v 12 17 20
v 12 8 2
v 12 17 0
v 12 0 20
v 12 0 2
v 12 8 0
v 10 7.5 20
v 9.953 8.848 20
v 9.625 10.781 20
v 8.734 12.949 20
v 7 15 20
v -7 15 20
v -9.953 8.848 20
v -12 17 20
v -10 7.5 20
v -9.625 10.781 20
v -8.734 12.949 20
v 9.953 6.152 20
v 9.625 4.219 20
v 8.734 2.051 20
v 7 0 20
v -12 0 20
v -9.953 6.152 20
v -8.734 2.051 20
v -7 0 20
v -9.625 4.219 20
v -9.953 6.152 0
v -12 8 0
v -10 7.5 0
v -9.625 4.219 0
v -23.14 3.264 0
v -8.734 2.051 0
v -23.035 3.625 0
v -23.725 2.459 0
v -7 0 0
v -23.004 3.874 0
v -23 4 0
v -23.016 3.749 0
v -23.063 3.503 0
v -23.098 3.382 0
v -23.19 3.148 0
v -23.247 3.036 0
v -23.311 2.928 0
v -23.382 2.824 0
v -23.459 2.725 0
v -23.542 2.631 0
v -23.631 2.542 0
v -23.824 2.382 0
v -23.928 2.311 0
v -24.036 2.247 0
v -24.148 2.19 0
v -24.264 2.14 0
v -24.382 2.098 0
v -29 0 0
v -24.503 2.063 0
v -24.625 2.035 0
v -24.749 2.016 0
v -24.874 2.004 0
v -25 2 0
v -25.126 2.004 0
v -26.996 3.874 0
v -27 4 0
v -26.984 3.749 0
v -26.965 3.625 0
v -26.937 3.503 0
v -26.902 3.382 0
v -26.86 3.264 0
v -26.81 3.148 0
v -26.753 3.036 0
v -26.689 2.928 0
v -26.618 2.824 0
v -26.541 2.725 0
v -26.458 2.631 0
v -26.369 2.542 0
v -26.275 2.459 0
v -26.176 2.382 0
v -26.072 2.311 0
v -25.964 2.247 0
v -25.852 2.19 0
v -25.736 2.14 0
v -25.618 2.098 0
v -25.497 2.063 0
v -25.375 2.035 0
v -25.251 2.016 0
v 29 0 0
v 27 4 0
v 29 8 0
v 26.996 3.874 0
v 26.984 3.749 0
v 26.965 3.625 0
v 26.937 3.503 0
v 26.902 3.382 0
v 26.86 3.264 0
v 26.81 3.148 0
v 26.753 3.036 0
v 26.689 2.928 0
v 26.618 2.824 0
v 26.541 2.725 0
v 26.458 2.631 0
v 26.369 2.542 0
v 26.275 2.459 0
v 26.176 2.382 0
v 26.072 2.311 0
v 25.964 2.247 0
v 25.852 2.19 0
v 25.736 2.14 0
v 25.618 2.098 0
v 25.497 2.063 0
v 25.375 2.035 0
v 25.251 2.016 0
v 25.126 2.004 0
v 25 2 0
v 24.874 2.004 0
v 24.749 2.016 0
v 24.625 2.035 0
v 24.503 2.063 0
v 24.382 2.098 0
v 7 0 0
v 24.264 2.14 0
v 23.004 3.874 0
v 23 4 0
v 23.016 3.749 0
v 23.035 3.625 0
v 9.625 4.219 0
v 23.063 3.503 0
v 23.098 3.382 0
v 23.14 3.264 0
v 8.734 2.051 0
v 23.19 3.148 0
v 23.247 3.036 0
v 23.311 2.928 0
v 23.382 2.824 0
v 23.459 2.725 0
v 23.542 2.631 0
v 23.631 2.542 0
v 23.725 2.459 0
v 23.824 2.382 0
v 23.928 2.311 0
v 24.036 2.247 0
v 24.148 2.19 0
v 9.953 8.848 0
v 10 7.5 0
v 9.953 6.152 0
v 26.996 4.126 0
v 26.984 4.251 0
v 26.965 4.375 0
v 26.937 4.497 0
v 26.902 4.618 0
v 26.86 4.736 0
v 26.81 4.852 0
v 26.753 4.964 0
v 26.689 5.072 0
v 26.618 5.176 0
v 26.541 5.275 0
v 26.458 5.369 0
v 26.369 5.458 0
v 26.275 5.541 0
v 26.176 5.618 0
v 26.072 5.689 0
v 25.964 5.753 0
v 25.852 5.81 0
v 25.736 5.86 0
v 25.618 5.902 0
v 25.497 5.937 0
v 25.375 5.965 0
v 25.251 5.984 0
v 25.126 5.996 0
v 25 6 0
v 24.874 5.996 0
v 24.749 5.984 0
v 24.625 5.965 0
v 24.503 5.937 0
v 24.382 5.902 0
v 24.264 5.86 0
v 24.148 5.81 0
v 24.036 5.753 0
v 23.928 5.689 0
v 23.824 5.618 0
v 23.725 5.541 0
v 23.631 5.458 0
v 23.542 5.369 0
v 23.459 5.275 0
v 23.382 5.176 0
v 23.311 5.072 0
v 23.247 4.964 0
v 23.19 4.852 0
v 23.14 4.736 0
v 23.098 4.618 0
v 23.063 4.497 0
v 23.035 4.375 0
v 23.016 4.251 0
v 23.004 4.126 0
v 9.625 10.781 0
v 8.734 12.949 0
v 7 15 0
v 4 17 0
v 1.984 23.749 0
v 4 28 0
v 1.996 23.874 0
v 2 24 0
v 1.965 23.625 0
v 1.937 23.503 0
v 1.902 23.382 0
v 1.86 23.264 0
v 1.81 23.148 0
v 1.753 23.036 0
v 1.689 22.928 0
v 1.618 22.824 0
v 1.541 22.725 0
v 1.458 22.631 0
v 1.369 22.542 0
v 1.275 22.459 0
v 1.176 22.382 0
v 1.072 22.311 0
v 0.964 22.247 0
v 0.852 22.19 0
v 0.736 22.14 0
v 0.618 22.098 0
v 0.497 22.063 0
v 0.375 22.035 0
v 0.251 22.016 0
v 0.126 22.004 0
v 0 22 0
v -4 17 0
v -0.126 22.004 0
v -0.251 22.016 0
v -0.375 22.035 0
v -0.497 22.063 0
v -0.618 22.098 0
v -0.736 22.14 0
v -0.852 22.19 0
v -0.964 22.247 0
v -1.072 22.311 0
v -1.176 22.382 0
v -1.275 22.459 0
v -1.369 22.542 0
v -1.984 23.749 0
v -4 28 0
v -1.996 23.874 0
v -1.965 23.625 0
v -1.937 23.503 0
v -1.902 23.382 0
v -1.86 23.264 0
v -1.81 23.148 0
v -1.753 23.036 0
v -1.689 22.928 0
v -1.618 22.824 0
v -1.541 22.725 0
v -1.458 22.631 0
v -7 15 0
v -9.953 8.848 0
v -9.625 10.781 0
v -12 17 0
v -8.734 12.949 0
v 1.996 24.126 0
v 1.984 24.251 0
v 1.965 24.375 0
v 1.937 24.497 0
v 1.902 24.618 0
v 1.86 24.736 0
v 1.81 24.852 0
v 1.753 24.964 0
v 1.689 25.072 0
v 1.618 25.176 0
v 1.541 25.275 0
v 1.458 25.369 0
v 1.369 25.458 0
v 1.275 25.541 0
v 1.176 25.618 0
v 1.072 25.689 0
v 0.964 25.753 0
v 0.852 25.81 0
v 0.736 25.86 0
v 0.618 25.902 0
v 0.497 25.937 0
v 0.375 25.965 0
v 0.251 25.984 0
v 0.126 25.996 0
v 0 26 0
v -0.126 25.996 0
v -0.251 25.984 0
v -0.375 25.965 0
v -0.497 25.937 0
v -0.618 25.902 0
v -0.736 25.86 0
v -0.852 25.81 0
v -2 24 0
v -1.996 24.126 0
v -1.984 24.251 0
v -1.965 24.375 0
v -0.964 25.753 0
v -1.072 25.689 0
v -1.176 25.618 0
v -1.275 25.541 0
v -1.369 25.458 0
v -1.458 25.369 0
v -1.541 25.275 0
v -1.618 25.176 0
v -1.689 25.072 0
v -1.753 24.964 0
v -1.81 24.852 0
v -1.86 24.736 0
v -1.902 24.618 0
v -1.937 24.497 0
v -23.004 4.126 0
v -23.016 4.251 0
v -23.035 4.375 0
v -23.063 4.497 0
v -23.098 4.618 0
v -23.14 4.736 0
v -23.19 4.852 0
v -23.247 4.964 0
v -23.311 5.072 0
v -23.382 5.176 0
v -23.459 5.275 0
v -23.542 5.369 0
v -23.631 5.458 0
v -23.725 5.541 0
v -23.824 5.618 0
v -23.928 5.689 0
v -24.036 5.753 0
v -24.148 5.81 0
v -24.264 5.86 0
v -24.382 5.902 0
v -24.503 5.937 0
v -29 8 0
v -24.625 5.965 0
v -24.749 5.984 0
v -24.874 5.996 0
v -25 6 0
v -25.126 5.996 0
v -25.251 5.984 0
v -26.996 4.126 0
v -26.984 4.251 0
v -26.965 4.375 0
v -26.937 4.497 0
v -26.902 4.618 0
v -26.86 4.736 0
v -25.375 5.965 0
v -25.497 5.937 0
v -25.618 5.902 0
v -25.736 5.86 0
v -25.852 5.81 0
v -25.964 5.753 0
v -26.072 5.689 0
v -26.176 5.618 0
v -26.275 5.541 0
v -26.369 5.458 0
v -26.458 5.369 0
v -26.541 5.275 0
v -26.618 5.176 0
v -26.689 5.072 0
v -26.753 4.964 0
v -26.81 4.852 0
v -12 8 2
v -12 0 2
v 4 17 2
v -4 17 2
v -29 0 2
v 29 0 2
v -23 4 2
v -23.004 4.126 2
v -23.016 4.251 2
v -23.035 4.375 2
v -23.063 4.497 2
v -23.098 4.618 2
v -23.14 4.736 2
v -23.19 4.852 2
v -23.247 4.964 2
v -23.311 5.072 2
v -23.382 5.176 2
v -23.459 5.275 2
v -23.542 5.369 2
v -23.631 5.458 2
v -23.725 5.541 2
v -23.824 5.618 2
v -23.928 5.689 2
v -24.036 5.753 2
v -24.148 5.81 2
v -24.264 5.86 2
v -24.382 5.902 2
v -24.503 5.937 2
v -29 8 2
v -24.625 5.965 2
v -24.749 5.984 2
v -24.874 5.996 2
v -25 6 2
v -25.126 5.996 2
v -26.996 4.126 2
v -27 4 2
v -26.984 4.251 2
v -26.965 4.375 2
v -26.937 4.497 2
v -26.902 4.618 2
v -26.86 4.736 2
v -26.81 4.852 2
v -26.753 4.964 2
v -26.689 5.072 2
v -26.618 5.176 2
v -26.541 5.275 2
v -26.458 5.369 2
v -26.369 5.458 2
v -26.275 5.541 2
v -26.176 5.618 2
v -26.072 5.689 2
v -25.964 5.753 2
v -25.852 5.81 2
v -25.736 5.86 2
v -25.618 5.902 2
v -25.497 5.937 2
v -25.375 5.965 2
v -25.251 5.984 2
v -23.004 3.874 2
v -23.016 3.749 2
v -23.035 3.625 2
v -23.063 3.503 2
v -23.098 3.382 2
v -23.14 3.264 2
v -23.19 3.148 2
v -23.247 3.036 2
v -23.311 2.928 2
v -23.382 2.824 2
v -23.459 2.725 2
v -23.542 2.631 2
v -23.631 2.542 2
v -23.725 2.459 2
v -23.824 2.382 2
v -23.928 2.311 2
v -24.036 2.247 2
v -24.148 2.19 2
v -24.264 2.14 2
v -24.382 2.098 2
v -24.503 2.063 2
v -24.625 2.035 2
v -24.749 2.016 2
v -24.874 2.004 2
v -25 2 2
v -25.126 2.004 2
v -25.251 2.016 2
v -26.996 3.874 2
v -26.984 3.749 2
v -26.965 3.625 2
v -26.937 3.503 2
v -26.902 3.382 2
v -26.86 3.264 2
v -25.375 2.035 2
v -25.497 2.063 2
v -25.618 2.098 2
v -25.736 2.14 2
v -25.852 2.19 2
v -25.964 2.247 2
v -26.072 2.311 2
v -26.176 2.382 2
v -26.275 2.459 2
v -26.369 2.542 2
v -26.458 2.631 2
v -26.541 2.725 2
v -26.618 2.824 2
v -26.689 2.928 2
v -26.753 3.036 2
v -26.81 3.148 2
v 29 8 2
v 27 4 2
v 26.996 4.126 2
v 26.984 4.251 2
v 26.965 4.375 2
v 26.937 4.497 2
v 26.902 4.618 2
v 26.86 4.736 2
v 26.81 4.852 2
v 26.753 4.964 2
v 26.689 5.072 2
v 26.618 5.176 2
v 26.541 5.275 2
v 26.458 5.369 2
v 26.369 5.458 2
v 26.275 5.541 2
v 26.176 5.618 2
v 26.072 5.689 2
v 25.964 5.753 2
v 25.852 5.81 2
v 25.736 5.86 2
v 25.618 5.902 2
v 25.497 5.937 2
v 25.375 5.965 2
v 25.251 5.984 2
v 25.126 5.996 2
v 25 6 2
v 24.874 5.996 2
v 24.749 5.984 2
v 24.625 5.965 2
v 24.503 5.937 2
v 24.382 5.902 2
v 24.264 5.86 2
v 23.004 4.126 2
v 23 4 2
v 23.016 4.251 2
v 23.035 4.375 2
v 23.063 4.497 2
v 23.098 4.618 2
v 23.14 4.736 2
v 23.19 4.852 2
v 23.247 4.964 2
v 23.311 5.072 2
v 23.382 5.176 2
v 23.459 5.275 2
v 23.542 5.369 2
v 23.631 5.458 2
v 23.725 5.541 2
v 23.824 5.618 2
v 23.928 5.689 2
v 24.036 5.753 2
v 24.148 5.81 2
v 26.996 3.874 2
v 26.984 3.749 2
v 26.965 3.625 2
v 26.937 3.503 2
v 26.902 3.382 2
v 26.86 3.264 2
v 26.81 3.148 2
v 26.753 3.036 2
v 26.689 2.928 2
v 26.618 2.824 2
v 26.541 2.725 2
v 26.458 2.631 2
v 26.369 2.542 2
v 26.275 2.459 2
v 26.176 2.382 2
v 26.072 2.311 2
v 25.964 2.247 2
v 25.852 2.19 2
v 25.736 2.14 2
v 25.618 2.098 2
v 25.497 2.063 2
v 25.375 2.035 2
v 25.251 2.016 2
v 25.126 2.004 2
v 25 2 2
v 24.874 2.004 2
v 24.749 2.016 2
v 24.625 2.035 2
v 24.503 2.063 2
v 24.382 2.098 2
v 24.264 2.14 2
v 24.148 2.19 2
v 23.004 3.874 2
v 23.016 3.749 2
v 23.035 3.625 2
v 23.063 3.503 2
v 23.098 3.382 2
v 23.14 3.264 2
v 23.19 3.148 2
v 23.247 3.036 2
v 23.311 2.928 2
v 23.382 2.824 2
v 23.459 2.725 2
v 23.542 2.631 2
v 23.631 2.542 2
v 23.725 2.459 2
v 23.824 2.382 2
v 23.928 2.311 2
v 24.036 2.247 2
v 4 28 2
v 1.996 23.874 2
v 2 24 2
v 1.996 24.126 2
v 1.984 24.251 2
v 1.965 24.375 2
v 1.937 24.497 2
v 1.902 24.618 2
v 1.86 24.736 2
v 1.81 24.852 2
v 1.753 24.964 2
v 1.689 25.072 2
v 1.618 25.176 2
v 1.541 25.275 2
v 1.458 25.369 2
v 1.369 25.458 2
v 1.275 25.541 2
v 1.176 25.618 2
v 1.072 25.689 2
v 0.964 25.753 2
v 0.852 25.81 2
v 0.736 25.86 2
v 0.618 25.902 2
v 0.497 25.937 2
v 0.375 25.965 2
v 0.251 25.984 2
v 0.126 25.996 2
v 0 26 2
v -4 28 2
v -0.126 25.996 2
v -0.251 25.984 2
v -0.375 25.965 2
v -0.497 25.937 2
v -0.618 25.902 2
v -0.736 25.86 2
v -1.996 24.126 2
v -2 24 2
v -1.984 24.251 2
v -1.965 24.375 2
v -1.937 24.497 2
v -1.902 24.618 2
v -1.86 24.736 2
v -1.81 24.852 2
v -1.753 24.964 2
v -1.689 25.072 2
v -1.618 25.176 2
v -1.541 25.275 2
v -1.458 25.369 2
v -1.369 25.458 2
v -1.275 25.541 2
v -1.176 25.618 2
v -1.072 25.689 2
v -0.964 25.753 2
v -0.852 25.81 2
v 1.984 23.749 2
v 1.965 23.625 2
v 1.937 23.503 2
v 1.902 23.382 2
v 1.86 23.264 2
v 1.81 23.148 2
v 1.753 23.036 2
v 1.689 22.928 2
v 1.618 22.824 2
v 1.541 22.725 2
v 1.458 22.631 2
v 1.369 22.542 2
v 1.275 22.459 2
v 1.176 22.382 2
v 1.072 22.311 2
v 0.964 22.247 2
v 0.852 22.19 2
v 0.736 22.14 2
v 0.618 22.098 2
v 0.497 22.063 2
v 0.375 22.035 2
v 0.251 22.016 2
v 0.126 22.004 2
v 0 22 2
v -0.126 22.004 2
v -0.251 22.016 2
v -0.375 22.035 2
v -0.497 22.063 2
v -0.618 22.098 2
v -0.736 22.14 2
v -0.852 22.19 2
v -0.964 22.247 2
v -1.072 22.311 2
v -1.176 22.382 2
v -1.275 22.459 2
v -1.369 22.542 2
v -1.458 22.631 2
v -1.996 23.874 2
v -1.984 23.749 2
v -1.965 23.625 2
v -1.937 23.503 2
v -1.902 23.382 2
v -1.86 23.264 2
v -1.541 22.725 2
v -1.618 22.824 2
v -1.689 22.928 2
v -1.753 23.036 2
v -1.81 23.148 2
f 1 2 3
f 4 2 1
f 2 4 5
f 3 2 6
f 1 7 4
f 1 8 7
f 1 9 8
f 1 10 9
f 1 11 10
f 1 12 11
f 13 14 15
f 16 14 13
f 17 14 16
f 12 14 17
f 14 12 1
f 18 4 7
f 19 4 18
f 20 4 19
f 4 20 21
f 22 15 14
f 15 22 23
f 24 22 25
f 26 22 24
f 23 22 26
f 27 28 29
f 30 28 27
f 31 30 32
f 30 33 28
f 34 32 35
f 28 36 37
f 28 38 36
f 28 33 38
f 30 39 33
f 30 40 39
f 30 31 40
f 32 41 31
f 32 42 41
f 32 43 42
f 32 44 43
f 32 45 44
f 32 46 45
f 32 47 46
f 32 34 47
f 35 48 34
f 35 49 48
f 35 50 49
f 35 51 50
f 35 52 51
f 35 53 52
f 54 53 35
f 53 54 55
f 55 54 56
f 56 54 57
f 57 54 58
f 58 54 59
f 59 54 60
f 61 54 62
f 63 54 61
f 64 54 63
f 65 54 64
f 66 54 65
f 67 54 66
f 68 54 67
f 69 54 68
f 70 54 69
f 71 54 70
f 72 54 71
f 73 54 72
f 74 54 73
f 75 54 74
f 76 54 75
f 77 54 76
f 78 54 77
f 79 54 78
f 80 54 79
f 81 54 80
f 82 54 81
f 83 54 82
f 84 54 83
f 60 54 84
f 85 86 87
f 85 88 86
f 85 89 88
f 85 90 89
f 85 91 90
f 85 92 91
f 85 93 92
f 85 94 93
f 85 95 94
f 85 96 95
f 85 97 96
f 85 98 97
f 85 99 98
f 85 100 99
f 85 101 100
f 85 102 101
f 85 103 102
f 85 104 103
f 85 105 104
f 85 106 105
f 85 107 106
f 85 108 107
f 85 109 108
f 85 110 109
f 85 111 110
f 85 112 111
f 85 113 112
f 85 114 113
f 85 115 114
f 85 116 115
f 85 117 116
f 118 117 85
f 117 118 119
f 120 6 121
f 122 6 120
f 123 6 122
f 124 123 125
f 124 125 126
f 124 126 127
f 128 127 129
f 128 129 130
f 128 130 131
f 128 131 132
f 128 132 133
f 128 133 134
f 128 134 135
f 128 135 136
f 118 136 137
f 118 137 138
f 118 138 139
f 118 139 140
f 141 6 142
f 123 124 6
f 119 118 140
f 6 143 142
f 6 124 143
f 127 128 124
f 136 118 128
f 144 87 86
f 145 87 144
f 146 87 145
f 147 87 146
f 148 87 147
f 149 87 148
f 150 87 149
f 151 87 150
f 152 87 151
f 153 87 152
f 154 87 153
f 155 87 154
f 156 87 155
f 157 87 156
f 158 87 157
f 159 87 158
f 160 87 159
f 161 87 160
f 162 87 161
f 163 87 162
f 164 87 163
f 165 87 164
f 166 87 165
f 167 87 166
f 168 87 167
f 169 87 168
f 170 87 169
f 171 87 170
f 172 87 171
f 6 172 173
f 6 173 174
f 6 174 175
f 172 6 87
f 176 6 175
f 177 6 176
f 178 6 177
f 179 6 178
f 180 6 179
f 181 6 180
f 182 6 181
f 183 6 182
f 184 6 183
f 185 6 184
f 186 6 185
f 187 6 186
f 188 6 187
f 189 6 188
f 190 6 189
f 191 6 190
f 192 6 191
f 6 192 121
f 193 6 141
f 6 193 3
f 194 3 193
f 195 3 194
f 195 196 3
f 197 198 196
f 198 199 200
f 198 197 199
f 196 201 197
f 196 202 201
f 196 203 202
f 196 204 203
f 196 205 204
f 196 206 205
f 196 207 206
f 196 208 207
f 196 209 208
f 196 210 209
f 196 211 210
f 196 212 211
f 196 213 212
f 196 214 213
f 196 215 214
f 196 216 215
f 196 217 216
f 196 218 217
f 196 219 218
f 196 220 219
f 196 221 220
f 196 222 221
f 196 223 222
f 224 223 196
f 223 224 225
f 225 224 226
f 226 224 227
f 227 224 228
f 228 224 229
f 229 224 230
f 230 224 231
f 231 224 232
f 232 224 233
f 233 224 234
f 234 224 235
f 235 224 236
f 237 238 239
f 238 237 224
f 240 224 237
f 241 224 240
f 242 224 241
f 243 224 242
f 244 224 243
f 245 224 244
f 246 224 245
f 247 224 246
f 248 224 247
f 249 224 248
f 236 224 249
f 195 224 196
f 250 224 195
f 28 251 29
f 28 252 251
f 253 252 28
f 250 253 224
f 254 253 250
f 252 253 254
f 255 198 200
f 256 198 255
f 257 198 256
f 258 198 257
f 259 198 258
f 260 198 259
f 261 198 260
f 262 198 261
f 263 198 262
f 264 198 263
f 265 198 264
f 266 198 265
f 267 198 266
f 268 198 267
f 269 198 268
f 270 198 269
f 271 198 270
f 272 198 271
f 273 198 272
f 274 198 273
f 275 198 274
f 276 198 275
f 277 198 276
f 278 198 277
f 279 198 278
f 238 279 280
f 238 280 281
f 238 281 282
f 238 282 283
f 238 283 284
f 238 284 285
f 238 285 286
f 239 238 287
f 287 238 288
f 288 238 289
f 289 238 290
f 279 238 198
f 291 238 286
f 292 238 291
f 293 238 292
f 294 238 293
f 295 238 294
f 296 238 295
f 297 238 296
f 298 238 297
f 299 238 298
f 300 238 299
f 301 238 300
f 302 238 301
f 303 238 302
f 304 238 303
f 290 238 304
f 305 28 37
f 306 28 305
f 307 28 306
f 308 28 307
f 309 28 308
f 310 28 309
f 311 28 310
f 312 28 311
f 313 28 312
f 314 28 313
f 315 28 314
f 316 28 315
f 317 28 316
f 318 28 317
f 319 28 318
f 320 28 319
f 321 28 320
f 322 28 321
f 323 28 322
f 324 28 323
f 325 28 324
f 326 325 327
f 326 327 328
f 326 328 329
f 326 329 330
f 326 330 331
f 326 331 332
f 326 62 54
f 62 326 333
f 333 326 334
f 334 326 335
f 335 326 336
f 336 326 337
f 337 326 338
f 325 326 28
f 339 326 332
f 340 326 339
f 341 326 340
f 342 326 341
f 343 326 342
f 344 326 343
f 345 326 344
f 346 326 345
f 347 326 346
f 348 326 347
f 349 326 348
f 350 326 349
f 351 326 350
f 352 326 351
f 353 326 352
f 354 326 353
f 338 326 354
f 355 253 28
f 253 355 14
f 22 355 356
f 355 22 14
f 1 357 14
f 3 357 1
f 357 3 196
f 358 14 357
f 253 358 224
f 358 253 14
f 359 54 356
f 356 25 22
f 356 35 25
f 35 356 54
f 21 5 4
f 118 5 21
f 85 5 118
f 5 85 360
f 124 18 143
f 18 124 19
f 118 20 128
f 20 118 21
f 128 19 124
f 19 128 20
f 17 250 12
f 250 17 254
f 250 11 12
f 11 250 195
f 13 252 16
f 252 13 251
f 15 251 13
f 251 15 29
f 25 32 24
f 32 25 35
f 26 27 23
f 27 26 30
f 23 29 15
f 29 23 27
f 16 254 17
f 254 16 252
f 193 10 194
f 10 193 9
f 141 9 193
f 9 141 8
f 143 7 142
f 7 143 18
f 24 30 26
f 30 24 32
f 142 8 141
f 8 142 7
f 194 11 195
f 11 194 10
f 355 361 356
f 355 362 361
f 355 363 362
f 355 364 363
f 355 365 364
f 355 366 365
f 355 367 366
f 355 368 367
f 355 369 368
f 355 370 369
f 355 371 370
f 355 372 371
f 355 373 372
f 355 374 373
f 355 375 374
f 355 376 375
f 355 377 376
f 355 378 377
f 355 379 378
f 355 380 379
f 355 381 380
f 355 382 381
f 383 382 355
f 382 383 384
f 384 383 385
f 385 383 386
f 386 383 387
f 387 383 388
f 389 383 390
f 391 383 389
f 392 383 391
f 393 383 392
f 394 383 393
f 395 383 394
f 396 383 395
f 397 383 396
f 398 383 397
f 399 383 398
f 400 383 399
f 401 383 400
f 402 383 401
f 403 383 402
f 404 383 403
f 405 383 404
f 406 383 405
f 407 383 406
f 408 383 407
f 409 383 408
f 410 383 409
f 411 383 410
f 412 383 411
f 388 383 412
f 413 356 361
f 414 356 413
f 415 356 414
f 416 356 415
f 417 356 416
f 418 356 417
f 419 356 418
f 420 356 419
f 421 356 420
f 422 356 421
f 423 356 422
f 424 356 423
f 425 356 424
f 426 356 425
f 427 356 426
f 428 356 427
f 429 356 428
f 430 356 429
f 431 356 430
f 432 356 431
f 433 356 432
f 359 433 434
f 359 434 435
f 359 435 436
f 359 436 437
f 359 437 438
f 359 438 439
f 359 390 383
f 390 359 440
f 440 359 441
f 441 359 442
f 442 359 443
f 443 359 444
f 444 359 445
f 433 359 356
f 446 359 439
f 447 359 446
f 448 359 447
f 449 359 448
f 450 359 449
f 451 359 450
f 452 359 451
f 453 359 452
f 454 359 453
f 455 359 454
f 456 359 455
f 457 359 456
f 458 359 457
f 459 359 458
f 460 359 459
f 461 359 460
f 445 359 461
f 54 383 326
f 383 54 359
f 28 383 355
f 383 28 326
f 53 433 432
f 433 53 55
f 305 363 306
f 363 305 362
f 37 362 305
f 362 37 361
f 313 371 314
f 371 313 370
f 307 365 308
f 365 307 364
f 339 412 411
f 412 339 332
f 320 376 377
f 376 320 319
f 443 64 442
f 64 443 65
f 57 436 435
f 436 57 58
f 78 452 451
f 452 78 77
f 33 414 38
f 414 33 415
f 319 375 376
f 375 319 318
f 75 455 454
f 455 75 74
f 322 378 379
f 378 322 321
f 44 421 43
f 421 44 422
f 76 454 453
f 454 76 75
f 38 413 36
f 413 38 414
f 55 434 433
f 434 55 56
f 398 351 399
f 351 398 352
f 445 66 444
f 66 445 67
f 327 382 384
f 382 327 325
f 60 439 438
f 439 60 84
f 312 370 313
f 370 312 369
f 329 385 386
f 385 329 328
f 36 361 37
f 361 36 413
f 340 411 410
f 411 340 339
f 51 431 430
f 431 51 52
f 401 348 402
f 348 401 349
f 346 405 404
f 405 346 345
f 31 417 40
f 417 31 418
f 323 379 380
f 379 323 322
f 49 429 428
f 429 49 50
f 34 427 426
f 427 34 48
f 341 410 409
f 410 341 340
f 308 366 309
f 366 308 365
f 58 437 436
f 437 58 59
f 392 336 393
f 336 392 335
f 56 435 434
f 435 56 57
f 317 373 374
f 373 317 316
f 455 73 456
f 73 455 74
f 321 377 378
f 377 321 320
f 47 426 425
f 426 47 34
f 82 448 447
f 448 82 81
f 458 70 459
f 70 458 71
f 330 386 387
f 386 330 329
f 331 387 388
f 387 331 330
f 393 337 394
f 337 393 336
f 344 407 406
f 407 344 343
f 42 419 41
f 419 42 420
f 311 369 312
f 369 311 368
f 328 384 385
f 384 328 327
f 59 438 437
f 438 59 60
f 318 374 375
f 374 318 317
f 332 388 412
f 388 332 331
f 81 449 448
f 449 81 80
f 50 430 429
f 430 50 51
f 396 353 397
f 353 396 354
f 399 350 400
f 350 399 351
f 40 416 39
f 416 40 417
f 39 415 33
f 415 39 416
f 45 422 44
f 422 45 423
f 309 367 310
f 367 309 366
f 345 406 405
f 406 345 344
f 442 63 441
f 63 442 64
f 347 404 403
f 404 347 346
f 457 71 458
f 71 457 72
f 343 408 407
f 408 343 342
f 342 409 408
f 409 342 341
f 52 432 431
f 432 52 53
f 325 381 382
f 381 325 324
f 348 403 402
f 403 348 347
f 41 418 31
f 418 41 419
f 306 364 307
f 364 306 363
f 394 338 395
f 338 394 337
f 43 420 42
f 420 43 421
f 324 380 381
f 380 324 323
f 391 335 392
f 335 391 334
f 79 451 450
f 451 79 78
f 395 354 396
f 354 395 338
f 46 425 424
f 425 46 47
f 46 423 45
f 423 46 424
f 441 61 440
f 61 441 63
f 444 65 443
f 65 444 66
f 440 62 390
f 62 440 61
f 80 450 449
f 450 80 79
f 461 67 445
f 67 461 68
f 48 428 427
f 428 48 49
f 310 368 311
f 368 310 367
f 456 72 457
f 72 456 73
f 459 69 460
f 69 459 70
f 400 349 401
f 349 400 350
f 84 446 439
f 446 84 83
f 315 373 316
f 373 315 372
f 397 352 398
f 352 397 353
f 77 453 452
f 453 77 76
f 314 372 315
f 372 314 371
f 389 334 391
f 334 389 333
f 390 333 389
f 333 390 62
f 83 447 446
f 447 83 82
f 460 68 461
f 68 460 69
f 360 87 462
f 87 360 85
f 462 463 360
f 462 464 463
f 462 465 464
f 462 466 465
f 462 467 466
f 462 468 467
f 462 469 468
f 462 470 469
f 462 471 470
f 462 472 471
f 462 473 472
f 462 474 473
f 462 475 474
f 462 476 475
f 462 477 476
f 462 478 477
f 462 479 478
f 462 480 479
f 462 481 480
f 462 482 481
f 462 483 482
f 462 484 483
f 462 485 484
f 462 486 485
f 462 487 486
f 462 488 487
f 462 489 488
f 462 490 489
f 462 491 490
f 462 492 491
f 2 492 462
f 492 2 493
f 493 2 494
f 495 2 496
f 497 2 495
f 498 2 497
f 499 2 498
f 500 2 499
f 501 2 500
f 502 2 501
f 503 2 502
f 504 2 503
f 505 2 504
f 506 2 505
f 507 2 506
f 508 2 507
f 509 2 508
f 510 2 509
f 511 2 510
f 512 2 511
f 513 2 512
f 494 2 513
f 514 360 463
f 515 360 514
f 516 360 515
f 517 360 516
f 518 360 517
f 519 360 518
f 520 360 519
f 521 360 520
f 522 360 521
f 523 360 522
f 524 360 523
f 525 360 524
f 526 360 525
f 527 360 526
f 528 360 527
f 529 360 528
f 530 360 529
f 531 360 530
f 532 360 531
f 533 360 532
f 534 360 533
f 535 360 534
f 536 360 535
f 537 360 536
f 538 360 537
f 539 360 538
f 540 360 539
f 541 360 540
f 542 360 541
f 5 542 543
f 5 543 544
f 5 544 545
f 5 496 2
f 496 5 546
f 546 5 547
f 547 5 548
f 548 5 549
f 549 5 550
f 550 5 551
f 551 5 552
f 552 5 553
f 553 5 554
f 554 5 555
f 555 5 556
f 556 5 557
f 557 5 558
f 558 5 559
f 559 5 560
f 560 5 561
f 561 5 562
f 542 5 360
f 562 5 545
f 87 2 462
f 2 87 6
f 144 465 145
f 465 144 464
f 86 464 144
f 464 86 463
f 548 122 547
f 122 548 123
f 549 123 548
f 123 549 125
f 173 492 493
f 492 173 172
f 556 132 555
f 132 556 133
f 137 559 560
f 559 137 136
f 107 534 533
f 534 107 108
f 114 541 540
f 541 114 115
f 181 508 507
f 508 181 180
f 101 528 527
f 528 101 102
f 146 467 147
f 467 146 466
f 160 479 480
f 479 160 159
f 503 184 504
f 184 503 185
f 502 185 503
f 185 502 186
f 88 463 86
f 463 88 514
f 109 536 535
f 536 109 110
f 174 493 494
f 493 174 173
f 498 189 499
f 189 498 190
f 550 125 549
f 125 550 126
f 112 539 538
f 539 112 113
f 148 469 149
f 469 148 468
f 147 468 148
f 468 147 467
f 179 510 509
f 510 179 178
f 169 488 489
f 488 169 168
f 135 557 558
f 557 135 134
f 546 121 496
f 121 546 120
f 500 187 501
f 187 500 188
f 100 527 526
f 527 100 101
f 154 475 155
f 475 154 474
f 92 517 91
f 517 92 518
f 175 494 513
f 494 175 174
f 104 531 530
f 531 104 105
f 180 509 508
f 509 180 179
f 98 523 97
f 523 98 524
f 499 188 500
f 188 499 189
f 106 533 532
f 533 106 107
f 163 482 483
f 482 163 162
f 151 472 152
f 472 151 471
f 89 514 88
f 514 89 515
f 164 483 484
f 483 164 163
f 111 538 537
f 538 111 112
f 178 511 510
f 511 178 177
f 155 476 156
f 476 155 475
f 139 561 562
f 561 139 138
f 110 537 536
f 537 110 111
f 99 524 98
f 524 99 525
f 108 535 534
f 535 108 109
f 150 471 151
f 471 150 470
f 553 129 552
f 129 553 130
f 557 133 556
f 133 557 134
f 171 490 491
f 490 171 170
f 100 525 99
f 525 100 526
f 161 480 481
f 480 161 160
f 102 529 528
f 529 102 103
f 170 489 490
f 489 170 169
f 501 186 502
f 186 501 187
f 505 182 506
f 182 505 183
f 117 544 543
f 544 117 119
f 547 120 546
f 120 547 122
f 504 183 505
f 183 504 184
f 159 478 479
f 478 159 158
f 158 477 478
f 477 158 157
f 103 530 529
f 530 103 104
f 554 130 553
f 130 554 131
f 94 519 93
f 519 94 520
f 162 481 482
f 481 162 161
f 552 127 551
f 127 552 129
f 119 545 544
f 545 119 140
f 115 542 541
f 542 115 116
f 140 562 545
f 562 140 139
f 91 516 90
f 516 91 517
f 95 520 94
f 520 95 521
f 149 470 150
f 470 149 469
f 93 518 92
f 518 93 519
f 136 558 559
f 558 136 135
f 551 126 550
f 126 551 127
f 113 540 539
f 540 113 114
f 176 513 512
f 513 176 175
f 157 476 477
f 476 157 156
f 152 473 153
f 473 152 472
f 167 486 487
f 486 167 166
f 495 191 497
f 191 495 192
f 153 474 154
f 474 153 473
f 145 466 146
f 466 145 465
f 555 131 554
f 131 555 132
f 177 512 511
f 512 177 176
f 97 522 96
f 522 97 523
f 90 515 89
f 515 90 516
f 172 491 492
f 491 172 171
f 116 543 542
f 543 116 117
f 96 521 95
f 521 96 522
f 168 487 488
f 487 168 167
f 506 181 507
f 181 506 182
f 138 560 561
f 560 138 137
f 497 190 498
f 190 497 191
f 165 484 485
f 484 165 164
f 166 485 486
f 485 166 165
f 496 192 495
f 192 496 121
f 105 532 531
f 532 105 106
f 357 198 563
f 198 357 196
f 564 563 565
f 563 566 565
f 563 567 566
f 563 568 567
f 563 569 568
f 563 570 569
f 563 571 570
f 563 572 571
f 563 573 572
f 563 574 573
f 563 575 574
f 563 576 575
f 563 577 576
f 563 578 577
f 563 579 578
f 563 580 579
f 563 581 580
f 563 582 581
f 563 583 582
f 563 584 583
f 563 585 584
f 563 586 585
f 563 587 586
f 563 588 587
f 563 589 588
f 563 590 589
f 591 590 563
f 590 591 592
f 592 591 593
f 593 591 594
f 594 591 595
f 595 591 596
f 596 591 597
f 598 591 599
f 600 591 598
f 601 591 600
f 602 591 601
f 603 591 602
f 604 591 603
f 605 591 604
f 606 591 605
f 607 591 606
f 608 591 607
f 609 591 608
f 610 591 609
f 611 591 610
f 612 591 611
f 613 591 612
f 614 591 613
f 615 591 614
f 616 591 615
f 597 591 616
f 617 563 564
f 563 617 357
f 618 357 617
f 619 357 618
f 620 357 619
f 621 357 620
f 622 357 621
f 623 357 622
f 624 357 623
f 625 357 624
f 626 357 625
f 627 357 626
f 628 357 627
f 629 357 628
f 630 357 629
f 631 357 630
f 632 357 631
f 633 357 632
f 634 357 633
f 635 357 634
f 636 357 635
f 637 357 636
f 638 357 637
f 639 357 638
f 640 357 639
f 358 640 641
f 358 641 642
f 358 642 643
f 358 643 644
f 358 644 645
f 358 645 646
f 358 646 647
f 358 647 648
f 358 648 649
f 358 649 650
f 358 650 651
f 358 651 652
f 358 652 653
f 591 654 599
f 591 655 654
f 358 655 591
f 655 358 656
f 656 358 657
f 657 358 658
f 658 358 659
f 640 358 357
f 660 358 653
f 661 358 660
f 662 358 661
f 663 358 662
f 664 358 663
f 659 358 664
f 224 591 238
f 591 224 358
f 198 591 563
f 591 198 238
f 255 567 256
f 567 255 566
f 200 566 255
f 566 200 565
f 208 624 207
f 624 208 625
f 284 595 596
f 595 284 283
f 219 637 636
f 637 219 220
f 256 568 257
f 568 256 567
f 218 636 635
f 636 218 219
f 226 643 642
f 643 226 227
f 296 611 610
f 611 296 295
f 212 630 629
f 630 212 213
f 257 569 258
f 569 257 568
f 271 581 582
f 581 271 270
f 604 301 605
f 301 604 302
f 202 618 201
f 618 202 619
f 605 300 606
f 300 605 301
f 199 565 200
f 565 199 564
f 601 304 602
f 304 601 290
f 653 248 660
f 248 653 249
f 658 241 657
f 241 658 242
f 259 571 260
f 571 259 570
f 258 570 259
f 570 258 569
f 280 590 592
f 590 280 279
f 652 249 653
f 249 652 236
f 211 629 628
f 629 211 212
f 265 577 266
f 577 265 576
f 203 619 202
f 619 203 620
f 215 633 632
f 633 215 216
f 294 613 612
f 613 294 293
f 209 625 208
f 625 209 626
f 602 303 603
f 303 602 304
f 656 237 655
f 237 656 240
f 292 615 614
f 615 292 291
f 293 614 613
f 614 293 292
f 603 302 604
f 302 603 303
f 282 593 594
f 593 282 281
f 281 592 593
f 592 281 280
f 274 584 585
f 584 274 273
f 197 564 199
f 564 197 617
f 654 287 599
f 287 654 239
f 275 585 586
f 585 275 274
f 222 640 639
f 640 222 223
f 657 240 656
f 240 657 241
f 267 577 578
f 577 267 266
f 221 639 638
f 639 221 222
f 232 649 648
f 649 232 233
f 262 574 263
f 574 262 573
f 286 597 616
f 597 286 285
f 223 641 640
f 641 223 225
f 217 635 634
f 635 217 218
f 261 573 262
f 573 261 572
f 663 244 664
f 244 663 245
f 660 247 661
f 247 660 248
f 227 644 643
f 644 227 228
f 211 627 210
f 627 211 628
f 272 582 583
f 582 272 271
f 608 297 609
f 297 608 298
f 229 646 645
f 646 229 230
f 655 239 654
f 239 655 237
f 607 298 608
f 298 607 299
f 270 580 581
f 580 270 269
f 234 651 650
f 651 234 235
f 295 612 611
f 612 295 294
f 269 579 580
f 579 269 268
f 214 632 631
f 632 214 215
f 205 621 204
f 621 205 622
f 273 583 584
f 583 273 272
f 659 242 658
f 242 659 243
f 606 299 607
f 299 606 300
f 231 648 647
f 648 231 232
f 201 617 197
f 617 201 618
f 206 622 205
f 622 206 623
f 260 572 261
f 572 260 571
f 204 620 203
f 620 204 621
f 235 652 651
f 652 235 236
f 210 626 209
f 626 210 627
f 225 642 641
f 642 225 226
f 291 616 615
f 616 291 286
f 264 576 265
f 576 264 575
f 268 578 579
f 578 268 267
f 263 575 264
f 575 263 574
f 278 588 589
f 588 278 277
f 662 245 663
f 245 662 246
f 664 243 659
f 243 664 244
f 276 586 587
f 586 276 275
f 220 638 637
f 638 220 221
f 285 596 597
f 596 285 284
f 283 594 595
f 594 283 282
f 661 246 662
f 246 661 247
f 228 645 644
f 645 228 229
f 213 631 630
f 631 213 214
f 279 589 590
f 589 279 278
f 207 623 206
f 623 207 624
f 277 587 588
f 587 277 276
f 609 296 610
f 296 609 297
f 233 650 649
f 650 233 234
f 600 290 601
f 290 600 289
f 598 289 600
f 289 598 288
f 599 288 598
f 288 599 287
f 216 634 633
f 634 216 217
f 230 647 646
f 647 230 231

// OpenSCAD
//box_column();
//gear_shim();
motor_fix();

/**
 * Стойки для коробки: 
 * высота=6мм
 * внутреннее отверстие для винта=4мм
 */
module box_column() {
  difference(){
    cylinder(h=6, r=5, $fn=100);
    translate([0,0,-1])
      cylinder(h=8, r=2.2, $fn=100);
  }
}

/**
 * Прокладка для шестеренки:
 * высота=1мм
 * 
 */
module gear_shim() {
  difference(){
    cylinder(h=1, r=4, $fn=100);
    translate([0,0,-1])
      cylinder(h=3, r=1.2, $fn=100);
  }
}

module motor_fix() {
  // блок для мотора
  difference() {
    translate([-12, 0, 0]) cube([24, 17, 20]);

    translate([-10, 0, -1])
      linear_extrude(height=22)
        import(file="motor_face.dxf");
  }

  // крепления
  difference() {
    translate([-18-11, 0, 0]) cube([18, 8, 2]);
    
    translate([-25, 4, -1]) cylinder(h=4, r=2, $fn=100);
  }

  difference() {
    translate([11, 0, 0]) cube([18, 8, 2]);
    
    translate([25, 4, -1]) cylinder(h=4, r=2, $fn=100);
  }

  difference() {
    translate([-4, 16, 0]) cube([8, 12, 2]);
    
    translate([0, 24, -1]) cylinder(h=4, r=2, $fn=100);
  }
}
